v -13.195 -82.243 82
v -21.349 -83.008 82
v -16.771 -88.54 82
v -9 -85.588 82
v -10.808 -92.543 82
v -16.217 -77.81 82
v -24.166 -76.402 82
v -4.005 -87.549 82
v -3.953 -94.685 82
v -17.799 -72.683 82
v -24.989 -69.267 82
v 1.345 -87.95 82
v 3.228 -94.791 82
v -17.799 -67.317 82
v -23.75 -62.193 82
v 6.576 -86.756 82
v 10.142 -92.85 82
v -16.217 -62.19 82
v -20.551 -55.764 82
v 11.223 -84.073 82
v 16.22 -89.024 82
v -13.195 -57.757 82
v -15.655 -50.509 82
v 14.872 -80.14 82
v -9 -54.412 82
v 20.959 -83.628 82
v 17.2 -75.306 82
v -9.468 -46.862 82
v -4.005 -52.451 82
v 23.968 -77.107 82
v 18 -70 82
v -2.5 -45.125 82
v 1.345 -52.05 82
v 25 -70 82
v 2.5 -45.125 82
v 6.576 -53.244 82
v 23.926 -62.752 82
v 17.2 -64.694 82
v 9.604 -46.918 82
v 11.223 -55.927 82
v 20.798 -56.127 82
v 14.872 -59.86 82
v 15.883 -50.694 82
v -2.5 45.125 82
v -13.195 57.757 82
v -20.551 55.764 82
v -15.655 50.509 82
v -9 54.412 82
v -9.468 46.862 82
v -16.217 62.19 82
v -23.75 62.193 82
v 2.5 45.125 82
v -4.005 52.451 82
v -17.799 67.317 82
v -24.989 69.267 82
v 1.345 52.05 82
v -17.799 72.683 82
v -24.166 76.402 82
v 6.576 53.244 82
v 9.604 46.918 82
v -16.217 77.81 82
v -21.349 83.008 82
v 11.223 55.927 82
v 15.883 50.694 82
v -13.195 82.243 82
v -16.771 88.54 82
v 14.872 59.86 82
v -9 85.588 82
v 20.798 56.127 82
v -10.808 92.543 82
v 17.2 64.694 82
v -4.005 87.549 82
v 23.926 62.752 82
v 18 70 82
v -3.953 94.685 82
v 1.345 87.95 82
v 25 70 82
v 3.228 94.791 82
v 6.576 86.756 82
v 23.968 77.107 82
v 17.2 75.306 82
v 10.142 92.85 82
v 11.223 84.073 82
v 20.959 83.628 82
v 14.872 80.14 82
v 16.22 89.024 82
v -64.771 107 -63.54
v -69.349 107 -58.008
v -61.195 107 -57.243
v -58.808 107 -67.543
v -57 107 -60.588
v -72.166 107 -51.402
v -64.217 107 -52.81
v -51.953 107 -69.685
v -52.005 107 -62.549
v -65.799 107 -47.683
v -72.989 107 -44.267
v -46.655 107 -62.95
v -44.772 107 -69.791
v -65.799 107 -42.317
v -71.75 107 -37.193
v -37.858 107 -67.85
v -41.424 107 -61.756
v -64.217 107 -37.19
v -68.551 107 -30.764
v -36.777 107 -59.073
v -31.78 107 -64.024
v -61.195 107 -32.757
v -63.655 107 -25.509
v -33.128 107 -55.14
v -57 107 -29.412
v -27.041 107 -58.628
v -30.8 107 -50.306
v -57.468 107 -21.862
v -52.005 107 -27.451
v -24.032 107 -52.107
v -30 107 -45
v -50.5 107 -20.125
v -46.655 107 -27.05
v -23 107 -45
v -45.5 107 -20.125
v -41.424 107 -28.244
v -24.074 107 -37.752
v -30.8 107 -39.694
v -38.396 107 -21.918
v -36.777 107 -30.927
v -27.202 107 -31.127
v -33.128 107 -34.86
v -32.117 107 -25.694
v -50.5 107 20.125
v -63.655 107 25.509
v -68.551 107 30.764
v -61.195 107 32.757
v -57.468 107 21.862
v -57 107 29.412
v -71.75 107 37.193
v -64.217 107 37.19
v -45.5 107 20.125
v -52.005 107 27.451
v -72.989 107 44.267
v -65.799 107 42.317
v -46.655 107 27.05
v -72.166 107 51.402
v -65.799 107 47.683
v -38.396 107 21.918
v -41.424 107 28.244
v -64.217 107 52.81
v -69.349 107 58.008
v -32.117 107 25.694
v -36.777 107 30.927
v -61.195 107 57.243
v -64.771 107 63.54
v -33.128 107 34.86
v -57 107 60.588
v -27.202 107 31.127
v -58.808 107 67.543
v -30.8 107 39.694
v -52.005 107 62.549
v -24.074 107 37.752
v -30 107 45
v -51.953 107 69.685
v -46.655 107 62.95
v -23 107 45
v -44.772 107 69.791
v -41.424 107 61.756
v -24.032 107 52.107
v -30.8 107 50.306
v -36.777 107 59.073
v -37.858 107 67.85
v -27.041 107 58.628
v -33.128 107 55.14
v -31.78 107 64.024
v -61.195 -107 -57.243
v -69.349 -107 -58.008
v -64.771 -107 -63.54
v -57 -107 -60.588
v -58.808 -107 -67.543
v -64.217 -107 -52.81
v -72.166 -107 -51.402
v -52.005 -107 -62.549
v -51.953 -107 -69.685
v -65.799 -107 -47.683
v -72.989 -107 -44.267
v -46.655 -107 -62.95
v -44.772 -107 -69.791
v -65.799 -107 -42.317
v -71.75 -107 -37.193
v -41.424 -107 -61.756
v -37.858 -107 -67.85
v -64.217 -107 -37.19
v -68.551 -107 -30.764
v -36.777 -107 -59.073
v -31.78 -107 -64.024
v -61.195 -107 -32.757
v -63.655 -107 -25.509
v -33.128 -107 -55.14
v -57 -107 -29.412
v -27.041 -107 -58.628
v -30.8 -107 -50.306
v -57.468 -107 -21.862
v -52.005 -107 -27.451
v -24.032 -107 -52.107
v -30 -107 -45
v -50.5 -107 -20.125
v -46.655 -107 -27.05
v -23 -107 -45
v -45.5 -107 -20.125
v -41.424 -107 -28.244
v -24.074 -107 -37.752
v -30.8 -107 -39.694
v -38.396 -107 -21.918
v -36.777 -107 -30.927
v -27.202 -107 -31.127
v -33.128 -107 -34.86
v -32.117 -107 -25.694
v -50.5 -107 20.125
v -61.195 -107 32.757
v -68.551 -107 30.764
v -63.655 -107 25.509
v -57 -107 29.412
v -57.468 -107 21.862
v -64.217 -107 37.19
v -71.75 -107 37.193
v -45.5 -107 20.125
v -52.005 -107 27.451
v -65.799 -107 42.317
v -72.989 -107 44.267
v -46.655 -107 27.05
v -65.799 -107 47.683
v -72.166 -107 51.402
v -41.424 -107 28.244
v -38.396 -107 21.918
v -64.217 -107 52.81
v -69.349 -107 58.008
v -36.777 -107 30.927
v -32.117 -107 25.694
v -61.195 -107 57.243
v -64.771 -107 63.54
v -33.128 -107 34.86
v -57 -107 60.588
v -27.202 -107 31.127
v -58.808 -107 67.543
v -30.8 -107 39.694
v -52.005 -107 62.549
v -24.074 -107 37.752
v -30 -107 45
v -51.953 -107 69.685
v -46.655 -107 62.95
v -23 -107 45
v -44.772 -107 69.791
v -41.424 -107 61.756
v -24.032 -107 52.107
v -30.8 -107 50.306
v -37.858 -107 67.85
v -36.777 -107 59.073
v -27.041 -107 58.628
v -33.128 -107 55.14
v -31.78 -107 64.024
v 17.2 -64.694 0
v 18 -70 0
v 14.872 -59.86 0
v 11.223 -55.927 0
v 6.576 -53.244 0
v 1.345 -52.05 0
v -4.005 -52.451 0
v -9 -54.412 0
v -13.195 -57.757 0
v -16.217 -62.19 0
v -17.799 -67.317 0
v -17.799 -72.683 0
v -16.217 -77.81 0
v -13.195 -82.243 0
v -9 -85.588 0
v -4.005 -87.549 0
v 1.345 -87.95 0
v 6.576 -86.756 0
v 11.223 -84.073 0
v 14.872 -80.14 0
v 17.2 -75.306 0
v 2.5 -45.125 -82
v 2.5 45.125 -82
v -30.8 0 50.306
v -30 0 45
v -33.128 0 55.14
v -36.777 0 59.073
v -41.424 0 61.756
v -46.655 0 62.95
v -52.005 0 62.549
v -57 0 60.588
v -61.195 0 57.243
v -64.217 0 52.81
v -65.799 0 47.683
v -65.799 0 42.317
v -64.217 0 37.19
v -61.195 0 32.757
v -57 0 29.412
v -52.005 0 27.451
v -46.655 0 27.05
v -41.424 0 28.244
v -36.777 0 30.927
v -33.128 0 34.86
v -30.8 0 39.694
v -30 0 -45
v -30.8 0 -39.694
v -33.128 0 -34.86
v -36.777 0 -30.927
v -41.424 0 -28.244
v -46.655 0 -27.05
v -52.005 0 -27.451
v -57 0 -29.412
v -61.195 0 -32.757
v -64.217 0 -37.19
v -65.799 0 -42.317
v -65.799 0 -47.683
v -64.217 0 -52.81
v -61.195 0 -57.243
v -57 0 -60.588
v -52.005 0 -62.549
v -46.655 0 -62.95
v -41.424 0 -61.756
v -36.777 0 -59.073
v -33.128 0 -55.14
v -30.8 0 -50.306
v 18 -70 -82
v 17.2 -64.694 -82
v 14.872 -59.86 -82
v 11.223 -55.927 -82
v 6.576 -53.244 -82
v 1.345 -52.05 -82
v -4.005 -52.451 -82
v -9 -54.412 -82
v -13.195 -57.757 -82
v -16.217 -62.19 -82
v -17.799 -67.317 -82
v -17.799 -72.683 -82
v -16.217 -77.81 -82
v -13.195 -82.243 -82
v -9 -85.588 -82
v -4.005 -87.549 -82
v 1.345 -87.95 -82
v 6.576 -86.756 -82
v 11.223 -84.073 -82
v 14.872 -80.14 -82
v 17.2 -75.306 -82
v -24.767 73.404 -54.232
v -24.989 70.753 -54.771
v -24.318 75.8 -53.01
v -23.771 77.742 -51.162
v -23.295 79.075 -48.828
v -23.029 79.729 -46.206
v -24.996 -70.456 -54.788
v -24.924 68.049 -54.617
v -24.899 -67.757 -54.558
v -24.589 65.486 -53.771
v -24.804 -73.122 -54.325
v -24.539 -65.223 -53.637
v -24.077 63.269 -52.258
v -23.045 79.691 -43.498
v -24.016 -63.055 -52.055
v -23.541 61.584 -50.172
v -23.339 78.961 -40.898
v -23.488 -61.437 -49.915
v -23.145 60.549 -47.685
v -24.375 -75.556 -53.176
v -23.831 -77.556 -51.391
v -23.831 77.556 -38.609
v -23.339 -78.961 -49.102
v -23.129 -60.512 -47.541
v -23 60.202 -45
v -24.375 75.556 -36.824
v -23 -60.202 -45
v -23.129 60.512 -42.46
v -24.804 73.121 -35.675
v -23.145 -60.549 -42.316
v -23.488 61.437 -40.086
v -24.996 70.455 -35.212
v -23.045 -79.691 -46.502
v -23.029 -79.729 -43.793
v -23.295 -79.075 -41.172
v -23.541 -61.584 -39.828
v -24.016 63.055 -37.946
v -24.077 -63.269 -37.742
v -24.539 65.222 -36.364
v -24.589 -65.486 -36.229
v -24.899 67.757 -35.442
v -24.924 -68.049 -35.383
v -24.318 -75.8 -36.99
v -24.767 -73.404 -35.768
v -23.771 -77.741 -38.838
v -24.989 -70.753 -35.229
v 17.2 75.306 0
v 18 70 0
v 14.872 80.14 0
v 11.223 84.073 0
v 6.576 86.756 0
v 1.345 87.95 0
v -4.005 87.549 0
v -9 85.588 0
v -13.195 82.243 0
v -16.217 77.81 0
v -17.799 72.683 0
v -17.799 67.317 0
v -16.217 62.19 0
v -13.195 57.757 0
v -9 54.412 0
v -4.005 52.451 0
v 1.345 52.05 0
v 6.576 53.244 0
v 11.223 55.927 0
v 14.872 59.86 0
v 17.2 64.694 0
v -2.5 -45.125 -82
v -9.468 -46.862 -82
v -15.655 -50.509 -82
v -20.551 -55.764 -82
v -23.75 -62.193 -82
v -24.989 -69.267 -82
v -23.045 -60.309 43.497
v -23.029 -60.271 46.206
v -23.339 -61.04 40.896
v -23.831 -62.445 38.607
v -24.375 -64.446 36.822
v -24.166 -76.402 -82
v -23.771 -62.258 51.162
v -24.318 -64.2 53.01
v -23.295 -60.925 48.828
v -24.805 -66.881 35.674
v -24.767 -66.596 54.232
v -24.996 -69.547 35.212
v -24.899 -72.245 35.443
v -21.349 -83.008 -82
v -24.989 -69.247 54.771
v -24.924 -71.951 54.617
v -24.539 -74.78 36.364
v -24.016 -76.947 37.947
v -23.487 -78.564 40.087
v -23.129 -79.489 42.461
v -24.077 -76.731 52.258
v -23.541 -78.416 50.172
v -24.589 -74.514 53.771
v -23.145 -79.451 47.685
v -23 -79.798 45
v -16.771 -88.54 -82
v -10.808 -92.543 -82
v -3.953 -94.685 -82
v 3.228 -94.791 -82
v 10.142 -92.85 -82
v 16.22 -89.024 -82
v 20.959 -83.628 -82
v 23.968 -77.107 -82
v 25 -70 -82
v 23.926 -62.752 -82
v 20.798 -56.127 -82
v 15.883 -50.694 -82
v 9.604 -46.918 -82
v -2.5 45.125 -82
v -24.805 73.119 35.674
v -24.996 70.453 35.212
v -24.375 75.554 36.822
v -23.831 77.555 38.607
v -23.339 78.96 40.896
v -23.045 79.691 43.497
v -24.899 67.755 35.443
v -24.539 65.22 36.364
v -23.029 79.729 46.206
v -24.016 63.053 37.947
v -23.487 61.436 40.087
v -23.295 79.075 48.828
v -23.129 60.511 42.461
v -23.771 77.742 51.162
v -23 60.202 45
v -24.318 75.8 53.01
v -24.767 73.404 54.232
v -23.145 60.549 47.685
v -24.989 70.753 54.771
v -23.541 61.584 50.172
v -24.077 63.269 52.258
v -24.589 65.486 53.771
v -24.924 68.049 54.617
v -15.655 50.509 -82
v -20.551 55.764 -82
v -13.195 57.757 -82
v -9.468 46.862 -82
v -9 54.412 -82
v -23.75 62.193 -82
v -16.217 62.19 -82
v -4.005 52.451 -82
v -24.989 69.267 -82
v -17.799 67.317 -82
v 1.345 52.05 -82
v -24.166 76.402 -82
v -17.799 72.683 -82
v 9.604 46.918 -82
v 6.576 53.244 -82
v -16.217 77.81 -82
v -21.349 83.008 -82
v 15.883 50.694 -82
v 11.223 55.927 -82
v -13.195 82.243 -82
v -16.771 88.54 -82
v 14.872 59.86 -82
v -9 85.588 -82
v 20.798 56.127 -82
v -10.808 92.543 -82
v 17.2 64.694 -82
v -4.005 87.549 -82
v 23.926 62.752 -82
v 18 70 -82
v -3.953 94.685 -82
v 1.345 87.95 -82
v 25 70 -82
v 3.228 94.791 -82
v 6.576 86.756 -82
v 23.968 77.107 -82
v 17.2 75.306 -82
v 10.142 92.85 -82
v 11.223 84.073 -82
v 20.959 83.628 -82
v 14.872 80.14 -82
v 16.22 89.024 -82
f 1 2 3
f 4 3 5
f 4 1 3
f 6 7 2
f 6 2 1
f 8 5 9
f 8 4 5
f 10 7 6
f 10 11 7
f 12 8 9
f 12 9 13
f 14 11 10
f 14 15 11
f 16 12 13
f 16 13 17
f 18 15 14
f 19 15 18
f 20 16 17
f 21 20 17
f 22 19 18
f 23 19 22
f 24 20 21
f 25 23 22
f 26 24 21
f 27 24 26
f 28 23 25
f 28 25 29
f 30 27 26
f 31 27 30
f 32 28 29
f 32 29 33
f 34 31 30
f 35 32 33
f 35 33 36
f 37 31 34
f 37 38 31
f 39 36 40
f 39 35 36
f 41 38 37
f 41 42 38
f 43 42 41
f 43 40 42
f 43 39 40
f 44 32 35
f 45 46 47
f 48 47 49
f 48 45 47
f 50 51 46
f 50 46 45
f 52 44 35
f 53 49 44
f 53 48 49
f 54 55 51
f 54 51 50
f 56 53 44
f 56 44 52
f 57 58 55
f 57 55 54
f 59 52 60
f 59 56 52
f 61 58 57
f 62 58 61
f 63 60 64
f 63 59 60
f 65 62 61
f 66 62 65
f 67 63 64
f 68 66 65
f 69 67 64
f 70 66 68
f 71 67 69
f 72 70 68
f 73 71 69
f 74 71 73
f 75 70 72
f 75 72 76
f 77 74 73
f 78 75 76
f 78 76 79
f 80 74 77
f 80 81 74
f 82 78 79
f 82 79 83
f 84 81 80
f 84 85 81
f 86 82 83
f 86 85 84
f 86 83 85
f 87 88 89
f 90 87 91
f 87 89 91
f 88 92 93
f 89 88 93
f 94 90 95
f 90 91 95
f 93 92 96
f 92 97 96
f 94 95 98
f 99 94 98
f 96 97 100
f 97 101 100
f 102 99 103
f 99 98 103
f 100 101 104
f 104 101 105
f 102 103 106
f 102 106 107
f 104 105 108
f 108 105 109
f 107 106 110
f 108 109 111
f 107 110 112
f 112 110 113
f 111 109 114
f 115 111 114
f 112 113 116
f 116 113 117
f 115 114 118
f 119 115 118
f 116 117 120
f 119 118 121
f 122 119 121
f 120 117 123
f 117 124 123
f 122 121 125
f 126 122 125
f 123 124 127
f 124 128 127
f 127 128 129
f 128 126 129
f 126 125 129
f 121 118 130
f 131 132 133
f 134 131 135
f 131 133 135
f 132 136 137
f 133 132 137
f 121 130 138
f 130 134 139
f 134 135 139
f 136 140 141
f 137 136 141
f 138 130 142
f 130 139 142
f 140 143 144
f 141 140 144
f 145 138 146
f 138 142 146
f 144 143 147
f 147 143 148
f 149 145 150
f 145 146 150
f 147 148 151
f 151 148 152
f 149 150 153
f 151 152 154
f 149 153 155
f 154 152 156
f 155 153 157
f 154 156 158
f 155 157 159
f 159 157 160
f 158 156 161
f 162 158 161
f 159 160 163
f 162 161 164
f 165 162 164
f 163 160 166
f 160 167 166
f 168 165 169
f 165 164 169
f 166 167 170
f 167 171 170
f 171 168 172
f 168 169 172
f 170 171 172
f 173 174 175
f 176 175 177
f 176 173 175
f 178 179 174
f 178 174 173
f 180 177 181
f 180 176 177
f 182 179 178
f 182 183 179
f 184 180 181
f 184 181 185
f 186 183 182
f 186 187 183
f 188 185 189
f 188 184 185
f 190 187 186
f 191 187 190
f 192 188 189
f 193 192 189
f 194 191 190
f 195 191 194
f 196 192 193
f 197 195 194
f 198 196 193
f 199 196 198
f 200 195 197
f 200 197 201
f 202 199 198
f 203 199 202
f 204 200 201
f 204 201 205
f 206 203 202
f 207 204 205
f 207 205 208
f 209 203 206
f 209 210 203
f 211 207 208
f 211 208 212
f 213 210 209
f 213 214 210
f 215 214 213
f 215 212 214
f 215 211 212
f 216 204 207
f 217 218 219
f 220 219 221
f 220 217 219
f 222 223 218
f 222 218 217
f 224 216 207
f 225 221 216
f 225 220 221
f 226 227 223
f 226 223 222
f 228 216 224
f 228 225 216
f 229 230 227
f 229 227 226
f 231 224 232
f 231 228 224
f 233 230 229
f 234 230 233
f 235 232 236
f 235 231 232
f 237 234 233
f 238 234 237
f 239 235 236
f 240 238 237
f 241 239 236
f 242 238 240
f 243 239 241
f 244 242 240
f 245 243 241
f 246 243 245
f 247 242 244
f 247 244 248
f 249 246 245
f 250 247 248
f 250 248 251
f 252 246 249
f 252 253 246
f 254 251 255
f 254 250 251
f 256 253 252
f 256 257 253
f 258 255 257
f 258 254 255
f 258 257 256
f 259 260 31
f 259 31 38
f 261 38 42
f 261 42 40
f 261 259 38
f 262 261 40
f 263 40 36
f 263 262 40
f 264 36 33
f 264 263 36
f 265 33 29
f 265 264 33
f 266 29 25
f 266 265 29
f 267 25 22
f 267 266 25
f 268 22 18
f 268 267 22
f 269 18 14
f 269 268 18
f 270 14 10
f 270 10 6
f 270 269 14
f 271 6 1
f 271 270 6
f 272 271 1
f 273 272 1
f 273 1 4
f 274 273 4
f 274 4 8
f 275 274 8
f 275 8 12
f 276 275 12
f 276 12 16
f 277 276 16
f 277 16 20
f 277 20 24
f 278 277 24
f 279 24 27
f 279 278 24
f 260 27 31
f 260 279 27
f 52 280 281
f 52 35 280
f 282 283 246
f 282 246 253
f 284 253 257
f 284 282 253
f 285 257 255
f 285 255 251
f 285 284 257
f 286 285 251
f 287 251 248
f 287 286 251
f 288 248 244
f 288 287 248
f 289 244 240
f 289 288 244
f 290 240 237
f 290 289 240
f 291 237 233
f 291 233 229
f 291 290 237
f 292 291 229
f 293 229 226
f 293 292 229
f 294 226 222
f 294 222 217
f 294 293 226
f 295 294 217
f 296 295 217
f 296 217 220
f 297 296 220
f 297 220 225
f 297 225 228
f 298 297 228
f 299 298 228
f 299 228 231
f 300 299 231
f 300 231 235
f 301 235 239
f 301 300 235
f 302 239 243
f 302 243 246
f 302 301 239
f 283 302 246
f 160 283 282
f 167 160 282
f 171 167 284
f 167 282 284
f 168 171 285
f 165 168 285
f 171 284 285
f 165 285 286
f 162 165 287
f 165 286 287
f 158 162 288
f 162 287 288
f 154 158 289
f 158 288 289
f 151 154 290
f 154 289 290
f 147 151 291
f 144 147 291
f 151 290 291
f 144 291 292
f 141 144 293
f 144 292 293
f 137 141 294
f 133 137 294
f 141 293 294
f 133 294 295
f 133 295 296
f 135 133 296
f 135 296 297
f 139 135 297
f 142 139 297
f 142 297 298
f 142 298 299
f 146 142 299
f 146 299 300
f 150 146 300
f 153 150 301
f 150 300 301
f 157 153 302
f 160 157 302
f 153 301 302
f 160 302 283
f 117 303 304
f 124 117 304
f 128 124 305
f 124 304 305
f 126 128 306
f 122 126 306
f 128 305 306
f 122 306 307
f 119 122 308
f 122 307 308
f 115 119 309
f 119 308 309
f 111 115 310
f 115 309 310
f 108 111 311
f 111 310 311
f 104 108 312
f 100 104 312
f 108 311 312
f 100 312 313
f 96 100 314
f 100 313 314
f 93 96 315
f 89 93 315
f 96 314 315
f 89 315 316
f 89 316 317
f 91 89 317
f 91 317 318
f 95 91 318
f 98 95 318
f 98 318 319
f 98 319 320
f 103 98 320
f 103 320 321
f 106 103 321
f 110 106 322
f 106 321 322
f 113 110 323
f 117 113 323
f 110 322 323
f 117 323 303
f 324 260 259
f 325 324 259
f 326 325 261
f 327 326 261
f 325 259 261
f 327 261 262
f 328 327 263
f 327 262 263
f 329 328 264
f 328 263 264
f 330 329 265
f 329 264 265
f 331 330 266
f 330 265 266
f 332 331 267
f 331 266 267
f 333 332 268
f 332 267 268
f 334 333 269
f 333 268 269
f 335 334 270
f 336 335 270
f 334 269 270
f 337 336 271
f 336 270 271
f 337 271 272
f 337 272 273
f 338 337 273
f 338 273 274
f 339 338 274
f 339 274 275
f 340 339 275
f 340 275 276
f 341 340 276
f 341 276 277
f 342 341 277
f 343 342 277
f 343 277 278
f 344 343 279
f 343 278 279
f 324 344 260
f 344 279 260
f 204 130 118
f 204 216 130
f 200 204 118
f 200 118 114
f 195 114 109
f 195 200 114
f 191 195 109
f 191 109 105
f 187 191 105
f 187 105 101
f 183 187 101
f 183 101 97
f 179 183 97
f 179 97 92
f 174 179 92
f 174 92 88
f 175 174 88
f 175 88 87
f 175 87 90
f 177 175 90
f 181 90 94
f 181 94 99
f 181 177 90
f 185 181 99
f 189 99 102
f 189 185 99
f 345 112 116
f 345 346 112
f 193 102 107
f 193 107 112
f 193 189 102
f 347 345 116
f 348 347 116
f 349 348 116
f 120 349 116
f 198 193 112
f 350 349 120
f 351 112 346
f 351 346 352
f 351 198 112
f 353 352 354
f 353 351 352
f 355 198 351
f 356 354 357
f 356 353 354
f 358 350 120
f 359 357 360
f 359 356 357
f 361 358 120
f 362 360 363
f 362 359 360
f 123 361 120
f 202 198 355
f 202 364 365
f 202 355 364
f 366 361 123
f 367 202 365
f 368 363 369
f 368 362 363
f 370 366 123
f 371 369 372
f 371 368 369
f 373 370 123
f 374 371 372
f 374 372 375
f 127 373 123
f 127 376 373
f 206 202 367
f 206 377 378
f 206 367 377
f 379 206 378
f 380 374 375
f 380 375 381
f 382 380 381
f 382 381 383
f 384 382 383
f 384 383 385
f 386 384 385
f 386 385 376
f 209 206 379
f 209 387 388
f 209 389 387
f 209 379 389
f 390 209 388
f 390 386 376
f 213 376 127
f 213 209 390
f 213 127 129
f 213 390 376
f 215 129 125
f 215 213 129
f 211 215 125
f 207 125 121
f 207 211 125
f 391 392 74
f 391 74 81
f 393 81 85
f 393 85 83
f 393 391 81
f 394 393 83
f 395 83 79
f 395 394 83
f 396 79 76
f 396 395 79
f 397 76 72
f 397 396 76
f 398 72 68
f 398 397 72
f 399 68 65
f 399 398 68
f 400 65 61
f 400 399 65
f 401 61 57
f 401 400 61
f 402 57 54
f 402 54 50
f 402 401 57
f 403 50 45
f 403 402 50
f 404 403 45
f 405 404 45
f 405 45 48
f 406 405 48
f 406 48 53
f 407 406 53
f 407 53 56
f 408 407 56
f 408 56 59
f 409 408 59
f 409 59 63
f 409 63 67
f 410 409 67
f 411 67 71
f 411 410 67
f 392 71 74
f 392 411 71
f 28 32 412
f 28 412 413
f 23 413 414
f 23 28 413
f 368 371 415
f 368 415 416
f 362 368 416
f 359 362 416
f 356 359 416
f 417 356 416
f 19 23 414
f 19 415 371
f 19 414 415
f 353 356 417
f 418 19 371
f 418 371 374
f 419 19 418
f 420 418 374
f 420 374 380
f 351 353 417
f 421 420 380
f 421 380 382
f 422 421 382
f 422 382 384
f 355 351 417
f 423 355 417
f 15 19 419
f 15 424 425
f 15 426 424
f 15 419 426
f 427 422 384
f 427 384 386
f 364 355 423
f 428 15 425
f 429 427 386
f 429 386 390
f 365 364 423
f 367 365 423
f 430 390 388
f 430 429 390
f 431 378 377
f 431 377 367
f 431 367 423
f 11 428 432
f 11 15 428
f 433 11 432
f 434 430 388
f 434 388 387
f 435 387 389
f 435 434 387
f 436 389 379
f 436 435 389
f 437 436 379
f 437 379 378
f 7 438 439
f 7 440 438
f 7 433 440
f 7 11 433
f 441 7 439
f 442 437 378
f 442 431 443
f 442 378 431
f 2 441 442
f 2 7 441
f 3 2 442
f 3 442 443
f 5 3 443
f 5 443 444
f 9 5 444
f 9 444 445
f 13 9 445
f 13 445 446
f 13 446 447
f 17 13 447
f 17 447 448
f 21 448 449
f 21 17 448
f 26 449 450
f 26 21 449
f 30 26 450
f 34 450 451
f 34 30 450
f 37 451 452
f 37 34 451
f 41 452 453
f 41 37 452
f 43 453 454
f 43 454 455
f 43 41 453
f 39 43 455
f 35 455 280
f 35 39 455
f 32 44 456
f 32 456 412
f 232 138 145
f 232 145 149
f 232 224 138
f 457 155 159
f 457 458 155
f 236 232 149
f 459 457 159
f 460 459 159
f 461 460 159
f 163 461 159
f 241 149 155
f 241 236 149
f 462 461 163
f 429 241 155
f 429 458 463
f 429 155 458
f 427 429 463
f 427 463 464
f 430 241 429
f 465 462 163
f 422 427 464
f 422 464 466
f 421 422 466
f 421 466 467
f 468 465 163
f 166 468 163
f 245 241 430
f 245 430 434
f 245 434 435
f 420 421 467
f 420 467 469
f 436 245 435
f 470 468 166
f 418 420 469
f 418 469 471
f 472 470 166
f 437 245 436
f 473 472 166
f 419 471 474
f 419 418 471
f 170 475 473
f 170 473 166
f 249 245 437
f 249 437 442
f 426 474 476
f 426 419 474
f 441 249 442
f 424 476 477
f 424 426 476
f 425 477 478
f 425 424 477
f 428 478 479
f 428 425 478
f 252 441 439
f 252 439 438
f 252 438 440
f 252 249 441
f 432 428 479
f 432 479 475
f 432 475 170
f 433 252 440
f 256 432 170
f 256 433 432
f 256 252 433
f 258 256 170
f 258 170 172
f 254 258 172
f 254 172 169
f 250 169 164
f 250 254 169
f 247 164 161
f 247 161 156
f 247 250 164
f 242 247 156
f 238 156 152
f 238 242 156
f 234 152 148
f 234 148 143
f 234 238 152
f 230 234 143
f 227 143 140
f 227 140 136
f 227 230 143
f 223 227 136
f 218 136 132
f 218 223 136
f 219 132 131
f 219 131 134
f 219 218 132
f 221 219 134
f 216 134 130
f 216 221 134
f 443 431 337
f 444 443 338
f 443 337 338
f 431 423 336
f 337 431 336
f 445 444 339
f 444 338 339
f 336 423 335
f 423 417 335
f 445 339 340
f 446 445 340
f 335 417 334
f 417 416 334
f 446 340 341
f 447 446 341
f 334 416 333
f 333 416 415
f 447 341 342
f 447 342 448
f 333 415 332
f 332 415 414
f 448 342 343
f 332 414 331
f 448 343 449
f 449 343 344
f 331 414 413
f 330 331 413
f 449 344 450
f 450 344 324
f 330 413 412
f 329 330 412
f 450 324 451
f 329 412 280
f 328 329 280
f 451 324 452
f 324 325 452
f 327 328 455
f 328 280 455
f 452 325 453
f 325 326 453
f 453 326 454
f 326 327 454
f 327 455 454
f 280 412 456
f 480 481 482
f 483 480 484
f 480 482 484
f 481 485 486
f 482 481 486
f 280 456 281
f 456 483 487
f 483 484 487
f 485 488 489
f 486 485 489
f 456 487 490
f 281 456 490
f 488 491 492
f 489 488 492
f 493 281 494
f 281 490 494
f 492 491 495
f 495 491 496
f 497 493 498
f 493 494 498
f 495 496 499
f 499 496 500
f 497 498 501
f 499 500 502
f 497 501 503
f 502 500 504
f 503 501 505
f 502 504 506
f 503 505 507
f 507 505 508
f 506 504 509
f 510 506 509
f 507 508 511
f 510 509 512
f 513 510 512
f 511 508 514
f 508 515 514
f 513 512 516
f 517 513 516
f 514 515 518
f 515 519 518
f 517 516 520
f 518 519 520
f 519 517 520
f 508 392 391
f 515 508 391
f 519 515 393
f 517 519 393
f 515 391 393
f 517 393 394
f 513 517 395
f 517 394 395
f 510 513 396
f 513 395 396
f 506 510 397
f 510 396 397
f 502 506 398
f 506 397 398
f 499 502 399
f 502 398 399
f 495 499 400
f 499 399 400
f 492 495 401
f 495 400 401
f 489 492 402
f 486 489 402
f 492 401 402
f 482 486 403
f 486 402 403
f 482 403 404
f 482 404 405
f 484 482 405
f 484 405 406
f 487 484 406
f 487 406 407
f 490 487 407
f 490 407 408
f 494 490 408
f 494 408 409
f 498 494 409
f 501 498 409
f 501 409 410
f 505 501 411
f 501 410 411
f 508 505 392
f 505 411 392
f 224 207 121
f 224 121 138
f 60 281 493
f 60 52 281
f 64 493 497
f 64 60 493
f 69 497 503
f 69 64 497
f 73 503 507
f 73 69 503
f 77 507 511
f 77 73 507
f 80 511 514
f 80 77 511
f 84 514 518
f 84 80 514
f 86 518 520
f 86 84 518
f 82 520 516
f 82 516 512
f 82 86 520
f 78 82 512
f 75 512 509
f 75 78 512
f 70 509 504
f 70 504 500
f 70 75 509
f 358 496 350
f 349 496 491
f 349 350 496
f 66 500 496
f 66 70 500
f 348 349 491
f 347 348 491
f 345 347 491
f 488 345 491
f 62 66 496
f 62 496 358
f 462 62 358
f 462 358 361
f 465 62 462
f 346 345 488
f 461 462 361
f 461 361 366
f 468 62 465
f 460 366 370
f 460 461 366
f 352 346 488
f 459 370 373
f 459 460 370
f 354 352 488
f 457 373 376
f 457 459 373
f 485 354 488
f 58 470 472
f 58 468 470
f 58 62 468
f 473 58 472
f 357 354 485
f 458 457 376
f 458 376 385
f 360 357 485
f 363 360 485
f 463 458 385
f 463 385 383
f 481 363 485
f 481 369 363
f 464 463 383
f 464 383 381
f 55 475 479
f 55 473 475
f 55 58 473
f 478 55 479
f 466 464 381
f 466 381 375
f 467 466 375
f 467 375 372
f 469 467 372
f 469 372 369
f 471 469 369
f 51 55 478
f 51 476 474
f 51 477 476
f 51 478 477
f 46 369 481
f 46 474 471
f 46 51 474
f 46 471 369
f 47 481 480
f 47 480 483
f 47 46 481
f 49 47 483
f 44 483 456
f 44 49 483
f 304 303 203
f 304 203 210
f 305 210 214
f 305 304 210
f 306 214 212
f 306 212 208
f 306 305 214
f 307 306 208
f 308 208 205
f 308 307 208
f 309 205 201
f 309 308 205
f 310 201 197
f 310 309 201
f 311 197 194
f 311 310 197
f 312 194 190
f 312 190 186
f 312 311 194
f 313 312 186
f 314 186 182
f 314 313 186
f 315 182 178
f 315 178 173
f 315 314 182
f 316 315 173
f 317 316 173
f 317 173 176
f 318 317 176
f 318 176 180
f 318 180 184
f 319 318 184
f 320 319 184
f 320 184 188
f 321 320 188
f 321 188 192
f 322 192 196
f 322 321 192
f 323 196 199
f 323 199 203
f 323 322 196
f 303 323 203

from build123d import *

# Parameters (mm, degrees)
F2_DEPTH      = 107
F2_DEPTH_BACK = 107
F0_R          = 18
F3_DEPTH      = 107
F3_DEPTH_BACK = 107
F1_R          = 18
F4_DEPTH      = 82
F4_DEPTH_BACK = 82


# Not quite as in the source:
# - a feature of the source that left no trace in its solid (it failed there, or was rolled back) is left out


with BuildPart() as f2:
    # F0 (on Front) → F2 (new body, two sides)
    with BuildSketch(Plane.XZ) as f2_sk:
        with BuildLine():
            ThreePointArc((-45.5, 20.1253140723), (-48, 20), (-50.5, 20.1253140723))
            Line((-50.5, 20.1253140723), (-50.5, -20.1253140723))
            ThreePointArc((-50.5, -20.1253140723), (-48, -20), (-45.5, -20.1253140723))
            Line((-45.5, -20.1253140723), (-45.5, 20.1253140723))
        make_face()
        with BuildLine():
            Line((-45.5, 20.1253140723), (-50.5, 20.1253140723))
            ThreePointArc((-50.5, 20.1253140723), (-48, 20), (-45.5, 20.1253140723))
        make_face()
        with BuildLine():
            ThreePointArc((-45.5, -20.1253140723), (-48, -20), (-50.5, -20.1253140723))
            Line((-50.5, -20.1253140723), (-45.5, -20.1253140723))
        make_face()
    extrude(amount=F2_DEPTH)
    extrude(f2_sk.sketch, amount=-F2_DEPTH_BACK)

    # F0 (on Front) → F3 (join, two sides)
    with BuildSketch(Plane.XZ) as f3_sk:
        with BuildLine():
            ThreePointArc((-45.5, 20.1253140723), (-29.4595037823, 28.2294901688), (-23, 45))
            ThreePointArc((-23, 45), (-64.7705098312, 63.5404962177), (-50.5, 20.1253140723))
            Line((-50.5, 20.1253140723), (-45.5, 20.1253140723))
        make_face()
        with Locations((-48, 45)):
            Circle(F0_R, mode=Mode.SUBTRACT)
        with BuildLine():
            Line((-45.5, -20.1253140723), (-50.5, -20.1253140723))
            ThreePointArc((-50.5, -20.1253140723), (-64.7705098312, -63.5404962177), (-23, -45))
            ThreePointArc((-23, -45), (-29.4595037823, -28.2294901688), (-45.5, -20.1253140723))
        make_face()
        with Locations((-48, -45)):
            Circle(F0_R, mode=Mode.SUBTRACT)
    extrude(amount=F3_DEPTH)
    extrude(f3_sk.sketch, amount=-F3_DEPTH_BACK)

    # F1 (on Top) → F4 (join, two sides)
    with BuildSketch(Plane.XY) as f4_sk:
        with BuildLine():
            ThreePointArc((2.5, 45.1253140723), (18.5404962177, 53.2294901688), (25, 70))
            ThreePointArc((25, 70), (-16.7705098312, 88.5404962177), (-2.5, 45.1253140723))
            Line((-2.5, 45.1253140723), (2.5, 45.1253140723))
        make_face()
        with Locations((0, 70)):
            Circle(F1_R, mode=Mode.SUBTRACT)
        with BuildLine():
            Line((2.5, 45.1253140723), (-2.5, 45.1253140723))
            ThreePointArc((-2.5, 45.1253140723), (0, 45), (2.5, 45.1253140723))
        make_face()
        with BuildLine():
            ThreePointArc((2.5, 45.1253140723), (0, 45), (-2.5, 45.1253140723))
            Line((-2.5, 45.1253140723), (-2.5, -45.1253140723))
            ThreePointArc((-2.5, -45.1253140723), (0, -45), (2.5, -45.1253140723))
            Line((2.5, -45.1253140723), (2.5, 45.1253140723))
        make_face()
        with BuildLine():
            ThreePointArc((2.5, -45.1253140723), (0, -45), (-2.5, -45.1253140723))
            Line((-2.5, -45.1253140723), (2.5, -45.1253140723))
        make_face()
        with BuildLine():
            Line((2.5, -45.1253140723), (-2.5, -45.1253140723))
            ThreePointArc((-2.5, -45.1253140723), (-16.7705098312, -88.5404962177), (25, -70))
            ThreePointArc((25, -70), (18.5404962177, -53.2294901688), (2.5, -45.1253140723))
        make_face()
        with Locations((0, -70)):
            Circle(F1_R, mode=Mode.SUBTRACT)
    extrude(amount=F4_DEPTH)
    extrude(f4_sk.sketch, amount=-F4_DEPTH_BACK)


solid = f2.part
